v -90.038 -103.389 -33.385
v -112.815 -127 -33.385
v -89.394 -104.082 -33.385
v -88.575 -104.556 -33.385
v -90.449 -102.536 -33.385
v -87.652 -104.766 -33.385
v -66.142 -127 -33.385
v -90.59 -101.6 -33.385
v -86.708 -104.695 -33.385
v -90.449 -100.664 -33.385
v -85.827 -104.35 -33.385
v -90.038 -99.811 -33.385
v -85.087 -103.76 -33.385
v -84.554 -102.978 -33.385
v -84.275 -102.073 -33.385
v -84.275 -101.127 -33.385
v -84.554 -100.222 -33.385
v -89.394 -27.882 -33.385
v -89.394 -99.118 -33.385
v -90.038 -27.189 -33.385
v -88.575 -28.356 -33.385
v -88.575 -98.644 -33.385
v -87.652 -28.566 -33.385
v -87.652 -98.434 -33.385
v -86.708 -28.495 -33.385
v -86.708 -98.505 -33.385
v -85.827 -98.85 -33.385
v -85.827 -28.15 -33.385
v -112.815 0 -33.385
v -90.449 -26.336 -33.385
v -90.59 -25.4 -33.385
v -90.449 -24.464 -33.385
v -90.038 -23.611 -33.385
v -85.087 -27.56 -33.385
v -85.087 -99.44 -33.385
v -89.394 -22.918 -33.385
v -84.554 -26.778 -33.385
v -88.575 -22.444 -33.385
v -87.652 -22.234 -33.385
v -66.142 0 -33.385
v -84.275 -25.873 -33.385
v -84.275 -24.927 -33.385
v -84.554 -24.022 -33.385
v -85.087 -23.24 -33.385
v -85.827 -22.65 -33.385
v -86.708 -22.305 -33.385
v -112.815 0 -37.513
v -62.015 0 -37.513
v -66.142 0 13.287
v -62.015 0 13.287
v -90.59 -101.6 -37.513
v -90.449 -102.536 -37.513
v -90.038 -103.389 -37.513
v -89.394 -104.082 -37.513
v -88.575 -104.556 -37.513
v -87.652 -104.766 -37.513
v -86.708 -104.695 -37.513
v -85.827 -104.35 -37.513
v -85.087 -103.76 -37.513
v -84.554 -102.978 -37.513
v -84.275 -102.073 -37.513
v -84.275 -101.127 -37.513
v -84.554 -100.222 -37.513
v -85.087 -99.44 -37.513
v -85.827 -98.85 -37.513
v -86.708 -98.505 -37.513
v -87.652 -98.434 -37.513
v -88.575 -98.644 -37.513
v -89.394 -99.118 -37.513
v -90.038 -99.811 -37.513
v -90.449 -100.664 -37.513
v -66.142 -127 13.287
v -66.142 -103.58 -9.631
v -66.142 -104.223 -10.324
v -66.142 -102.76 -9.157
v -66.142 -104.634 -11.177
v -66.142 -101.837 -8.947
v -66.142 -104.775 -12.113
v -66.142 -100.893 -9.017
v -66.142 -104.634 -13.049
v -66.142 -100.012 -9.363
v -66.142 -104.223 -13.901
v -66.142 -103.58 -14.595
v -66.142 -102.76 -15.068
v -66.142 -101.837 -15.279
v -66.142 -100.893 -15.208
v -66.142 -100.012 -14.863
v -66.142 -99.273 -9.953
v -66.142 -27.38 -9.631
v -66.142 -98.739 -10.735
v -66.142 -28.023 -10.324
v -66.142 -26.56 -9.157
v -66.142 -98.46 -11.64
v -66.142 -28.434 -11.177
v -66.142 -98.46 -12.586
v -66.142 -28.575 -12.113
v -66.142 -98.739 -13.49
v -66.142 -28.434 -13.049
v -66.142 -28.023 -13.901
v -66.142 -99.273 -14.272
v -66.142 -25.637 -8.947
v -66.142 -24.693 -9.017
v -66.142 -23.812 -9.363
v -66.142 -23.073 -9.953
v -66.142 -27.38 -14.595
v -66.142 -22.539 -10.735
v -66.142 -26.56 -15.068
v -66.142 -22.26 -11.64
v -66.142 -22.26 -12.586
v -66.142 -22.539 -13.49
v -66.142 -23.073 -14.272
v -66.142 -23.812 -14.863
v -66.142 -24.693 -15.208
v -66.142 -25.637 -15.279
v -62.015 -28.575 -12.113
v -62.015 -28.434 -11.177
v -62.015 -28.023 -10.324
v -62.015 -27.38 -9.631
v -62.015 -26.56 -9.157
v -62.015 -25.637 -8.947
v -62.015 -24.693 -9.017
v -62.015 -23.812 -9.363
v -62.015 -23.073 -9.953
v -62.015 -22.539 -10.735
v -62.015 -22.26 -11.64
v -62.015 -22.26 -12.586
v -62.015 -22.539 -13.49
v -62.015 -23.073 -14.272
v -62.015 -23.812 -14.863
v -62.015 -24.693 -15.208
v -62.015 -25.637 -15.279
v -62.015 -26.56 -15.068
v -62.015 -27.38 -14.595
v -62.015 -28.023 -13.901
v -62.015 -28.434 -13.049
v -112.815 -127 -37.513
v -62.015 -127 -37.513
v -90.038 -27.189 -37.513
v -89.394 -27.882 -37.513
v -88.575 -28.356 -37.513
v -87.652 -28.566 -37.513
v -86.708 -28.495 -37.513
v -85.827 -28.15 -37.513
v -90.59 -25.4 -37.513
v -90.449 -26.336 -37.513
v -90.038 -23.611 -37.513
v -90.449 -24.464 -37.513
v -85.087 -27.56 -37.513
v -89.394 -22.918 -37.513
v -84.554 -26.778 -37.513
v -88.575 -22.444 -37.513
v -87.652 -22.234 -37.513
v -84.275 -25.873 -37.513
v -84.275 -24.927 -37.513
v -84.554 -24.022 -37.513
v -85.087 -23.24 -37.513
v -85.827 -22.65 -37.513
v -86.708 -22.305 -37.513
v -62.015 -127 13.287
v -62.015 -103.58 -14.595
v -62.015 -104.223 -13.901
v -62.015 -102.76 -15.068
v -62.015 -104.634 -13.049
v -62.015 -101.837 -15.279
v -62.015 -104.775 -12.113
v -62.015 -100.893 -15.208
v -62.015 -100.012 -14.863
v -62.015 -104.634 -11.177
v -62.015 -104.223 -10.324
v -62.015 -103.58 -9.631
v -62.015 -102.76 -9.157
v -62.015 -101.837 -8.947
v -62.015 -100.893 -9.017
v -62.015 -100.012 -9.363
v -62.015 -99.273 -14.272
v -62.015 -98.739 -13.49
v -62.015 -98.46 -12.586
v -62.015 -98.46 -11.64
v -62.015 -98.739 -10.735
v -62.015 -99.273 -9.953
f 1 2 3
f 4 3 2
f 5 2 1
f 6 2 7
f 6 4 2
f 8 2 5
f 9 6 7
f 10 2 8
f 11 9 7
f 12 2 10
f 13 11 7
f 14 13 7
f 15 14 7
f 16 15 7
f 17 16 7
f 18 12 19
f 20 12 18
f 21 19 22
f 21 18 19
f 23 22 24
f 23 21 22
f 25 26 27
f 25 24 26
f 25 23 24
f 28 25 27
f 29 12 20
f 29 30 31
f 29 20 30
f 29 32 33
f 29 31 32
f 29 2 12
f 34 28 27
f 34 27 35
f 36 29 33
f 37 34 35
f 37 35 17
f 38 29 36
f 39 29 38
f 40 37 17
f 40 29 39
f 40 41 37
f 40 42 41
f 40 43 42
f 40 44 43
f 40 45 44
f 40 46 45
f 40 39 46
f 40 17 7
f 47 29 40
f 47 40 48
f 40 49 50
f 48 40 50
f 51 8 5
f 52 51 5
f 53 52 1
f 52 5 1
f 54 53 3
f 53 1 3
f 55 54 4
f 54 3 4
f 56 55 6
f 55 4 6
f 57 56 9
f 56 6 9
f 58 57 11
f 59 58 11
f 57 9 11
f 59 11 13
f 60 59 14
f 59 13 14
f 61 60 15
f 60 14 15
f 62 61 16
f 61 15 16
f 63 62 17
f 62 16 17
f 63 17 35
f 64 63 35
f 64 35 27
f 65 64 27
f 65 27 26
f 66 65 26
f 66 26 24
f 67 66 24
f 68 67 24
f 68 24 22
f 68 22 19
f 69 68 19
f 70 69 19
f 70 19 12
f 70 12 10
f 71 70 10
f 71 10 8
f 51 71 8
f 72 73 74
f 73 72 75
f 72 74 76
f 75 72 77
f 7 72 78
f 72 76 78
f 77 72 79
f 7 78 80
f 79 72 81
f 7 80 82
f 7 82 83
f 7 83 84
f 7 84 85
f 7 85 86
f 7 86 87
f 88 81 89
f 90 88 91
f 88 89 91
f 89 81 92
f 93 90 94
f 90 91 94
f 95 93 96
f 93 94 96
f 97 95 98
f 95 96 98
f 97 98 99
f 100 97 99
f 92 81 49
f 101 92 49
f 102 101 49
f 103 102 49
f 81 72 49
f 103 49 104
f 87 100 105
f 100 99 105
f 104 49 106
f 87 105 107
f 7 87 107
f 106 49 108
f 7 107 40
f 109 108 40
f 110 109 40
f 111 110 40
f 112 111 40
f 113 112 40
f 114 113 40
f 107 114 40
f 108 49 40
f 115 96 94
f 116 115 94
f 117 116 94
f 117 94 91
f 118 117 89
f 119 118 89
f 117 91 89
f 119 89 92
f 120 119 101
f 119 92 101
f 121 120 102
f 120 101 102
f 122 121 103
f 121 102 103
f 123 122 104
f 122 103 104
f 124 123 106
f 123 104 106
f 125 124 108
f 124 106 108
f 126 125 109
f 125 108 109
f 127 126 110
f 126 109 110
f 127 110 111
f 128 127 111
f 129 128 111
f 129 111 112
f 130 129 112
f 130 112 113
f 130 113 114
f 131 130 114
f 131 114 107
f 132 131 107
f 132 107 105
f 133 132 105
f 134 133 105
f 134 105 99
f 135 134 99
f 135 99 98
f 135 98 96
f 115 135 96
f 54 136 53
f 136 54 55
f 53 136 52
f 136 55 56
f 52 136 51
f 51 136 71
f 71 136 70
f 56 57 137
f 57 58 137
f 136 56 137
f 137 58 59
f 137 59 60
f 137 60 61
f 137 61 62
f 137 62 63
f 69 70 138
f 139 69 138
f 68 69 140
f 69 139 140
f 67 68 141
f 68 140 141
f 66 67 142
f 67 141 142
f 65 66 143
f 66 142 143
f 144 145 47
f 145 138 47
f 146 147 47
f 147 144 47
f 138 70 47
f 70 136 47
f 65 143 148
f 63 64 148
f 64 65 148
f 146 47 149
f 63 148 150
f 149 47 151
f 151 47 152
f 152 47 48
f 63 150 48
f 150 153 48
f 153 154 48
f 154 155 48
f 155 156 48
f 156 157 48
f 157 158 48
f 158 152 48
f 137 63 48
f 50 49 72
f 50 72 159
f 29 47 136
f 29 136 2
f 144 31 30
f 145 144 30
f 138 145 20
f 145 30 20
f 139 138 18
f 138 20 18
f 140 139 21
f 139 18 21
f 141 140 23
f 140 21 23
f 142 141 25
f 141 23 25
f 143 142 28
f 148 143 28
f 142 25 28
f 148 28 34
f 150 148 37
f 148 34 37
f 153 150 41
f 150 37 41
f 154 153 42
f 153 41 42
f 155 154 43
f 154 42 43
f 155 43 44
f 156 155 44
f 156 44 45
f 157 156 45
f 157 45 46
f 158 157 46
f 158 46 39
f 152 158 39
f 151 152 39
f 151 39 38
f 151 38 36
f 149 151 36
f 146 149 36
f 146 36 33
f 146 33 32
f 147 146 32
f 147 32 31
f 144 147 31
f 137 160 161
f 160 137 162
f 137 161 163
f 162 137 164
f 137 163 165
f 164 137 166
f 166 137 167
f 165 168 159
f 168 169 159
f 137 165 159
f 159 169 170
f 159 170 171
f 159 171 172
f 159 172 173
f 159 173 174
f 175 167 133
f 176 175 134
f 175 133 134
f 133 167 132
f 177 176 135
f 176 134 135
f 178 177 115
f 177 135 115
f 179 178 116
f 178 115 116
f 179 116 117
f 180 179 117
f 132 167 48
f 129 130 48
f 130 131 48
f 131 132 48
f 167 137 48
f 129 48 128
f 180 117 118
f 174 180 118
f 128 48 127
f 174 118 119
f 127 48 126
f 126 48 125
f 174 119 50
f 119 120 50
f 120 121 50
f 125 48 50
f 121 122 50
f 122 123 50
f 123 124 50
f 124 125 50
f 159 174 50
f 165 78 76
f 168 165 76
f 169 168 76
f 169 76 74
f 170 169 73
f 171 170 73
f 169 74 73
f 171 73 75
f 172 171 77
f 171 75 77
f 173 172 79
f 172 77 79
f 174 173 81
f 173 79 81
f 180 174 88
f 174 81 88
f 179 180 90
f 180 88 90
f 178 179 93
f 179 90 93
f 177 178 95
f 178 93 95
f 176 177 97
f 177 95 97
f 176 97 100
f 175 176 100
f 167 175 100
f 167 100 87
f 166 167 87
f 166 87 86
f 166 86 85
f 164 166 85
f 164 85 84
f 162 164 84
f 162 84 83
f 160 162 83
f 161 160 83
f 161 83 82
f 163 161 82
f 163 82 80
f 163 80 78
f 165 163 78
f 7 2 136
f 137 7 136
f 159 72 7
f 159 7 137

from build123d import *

# Parameters (mm, degrees)
F0_W     = 4.1275
F0_H     = 46.6725
F0_H_2   = 4.1275
F0_W_2   = 46.6725
F1_DEPTH = 127
F4_D     = 6.35
F5_D     = 6.35
F6_D     = 6.35
F7_D     = 6.35


with BuildPart() as f1:
    # F0 (on Front) → F1 (new body)
    with BuildSketch(Plane.XZ):
        with Locations((-64.07842, -10.049134)):
            Rectangle(F0_W, F0_H)
        with Locations((-64.07842, -35.449134)):
            Rectangle(F0_W, F0_H_2)
        with Locations((-89.47842, -35.449134)):
            Rectangle(F0_W_2, F0_H_2)
    extrude(amount=F1_DEPTH)

    # F4 (through all)
    with Locations(Plane.YZ.offset(-62.01467)):
        with Locations((-101.6, -12.112884)):
            Hole(F4_D / 2)

    # F5 (through all)
    with Locations(Plane(origin=(0, 0, -37.512884), x_dir=(1, 0, 0), z_dir=(0, 0, -1))):
        with Locations((-87.41467, 101.6)):
            Hole(F5_D / 2)

    # F6 (through all)
    with Locations(Plane.YZ.offset(-62.01467)):
        with Locations((-25.4, -12.112884)):
            Hole(F6_D / 2)

    # F7 (through all)
    with Locations(Plane(origin=(0, 0, -37.512884), x_dir=(1, 0, 0), z_dir=(0, 0, -1))):
        with Locations((-87.41467, 25.4)):
            Hole(F7_D / 2)


solid = f1.part
